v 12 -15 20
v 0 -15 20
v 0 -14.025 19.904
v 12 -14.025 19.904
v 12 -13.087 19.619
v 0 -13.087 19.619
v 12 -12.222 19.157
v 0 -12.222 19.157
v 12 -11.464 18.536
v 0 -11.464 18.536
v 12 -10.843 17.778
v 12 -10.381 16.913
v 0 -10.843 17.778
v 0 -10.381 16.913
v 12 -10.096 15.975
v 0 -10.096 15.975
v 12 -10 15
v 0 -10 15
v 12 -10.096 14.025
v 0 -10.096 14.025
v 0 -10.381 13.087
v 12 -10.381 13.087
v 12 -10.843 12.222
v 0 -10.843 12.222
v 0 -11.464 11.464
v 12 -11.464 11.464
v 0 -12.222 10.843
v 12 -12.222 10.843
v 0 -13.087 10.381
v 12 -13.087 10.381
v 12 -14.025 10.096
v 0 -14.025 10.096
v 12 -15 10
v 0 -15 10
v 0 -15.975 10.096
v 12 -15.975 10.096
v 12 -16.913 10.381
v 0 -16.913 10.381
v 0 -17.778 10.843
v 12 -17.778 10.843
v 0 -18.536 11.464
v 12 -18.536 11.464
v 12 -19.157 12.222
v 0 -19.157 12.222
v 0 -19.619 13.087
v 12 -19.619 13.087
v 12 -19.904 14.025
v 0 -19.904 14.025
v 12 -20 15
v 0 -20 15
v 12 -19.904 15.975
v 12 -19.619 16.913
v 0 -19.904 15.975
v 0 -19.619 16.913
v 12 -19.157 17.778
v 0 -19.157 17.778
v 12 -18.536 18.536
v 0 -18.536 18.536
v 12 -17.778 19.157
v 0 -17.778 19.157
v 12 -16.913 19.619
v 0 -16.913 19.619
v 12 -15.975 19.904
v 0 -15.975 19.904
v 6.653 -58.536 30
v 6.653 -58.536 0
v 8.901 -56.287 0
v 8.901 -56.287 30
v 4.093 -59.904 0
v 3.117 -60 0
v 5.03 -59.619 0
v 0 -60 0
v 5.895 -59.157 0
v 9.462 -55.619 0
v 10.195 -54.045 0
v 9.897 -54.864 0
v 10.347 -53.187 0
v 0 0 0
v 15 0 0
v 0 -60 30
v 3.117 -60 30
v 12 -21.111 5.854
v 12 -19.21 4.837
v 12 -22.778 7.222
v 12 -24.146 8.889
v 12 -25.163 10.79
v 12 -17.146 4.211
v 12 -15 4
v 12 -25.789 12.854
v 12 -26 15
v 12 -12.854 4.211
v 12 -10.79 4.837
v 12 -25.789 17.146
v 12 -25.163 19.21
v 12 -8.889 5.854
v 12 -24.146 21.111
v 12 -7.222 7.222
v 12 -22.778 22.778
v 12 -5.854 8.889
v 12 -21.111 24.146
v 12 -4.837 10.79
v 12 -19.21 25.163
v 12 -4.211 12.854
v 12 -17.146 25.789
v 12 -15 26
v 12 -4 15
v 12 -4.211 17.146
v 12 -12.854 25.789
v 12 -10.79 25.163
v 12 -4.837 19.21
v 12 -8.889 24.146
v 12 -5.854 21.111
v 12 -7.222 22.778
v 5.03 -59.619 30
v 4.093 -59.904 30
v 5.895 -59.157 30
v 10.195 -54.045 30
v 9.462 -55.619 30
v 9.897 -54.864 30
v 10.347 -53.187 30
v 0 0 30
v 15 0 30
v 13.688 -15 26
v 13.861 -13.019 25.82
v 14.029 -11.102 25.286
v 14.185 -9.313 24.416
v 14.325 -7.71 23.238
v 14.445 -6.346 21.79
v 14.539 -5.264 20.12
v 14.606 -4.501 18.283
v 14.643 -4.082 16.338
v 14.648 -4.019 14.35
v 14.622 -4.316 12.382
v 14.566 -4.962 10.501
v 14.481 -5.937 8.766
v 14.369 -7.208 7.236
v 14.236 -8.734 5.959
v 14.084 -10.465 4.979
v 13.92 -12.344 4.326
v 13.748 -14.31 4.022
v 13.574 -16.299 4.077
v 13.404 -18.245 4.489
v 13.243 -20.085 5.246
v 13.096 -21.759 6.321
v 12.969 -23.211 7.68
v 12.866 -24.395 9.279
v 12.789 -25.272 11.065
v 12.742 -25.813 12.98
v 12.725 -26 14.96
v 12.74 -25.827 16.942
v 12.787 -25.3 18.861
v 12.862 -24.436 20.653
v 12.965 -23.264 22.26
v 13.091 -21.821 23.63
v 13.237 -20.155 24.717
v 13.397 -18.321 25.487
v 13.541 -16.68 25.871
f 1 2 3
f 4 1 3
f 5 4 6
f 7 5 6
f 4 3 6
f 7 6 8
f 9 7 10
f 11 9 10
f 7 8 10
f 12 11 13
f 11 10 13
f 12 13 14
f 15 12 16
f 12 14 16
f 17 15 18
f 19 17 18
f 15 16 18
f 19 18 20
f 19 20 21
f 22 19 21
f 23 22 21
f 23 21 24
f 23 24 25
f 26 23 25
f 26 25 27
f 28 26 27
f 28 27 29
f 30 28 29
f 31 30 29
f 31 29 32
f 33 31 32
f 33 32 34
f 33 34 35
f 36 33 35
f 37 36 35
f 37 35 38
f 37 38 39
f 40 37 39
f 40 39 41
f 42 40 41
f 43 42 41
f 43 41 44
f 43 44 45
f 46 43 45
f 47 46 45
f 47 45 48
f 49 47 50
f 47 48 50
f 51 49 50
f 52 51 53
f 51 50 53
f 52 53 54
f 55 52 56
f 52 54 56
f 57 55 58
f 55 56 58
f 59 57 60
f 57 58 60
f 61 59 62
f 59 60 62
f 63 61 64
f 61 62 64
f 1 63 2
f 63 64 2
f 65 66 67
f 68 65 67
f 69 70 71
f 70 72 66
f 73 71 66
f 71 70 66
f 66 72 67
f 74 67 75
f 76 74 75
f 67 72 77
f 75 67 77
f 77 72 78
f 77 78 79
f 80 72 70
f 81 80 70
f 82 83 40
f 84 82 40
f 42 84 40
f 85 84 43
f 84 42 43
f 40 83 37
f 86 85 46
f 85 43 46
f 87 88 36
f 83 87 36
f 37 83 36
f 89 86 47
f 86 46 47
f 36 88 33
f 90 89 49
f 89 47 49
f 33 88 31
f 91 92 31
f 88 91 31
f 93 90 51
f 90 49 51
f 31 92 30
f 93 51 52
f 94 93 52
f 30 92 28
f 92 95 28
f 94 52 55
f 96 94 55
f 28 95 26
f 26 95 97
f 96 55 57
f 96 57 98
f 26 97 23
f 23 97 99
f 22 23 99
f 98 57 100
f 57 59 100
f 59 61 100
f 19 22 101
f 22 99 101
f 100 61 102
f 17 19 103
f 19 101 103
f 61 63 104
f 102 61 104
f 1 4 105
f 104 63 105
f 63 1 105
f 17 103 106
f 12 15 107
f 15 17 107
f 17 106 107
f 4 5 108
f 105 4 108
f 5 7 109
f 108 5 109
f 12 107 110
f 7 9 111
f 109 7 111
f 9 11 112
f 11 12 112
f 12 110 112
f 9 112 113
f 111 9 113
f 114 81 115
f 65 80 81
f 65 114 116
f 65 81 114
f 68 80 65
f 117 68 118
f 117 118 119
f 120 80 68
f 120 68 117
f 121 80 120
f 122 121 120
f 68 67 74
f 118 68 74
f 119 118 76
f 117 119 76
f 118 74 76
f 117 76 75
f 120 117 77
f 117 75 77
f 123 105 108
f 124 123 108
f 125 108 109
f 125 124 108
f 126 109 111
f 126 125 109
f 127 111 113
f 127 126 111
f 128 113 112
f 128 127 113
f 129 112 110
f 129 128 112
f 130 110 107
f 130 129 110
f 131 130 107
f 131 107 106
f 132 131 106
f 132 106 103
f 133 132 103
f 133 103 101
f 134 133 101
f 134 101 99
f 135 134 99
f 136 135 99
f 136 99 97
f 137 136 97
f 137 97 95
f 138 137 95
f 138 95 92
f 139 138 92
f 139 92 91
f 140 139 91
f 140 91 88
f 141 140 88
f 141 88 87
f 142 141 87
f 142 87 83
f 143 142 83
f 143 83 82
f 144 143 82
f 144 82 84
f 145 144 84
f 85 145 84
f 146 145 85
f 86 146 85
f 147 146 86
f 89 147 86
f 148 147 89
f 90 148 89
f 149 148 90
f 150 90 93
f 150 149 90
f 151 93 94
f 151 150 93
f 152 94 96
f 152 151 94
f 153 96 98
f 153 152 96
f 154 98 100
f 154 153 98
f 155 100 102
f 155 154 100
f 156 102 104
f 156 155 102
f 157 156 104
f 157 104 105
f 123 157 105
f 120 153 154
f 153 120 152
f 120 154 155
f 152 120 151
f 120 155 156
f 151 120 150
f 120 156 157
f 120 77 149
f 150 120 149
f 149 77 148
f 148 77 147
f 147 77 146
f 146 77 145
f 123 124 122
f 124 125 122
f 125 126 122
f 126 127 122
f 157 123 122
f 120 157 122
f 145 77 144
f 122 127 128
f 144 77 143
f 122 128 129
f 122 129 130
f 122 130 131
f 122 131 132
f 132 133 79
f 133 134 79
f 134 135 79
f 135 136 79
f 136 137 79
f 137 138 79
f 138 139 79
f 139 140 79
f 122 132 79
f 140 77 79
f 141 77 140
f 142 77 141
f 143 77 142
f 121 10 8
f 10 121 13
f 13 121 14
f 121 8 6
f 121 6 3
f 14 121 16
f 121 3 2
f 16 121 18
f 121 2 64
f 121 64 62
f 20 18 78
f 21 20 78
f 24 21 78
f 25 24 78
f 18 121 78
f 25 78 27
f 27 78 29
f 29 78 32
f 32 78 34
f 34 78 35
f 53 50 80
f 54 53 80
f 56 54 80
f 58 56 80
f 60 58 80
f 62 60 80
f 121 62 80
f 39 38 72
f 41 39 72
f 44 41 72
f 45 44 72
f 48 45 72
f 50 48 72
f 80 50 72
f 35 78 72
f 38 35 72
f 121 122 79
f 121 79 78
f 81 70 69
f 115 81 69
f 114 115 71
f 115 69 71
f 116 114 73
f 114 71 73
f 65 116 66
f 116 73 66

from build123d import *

# Parameters (mm, degrees)
EXTRUDE_1_DEPTH     = 30
SKETCH_3_R          = 5
CUT_EXTRUDE_2_DEPTH = 21
CUT_EXTRUDE_START   = -15
SKETCH_5_R          = 11
CUT_EXTRUDE_3_DEPTH = 3


with BuildPart() as part:
    # Эскиз1 → Бобышка-Вытянуть1 (new body)
    with BuildSketch(Plane.XY):
        with BuildLine():
            Line((0, 0), (0, -60))
            Line((0, -60), (3.117055694, -60))
            ThreePointArc((3.117055694, -60), (5.030472856, -59.619397663), (6.6525896, -58.535533906))
            Line((6.6525896, -58.535533906), (8.901294402, -56.286829104))
            ThreePointArc((8.901294402, -56.286829104), (9.897299431, -54.864386507), (10.346733987, -53.187073912))
            Line((10.346733987, -53.187073912), (15, 0))
            Line((15, 0), (0, 0))
        make_face()
    extrude(amount=EXTRUDE_1_DEPTH)

    # Эскиз3 → Вырез-Вытянуть2 (cut)
    with BuildSketch(Plane.ZY):
        with Locations((15, -15)):
            Circle(SKETCH_3_R)
    extrude(amount=-CUT_EXTRUDE_2_DEPTH, mode=Mode.SUBTRACT)

    # Эскиз5 → Вырез-Вытянуть3 (cut)
    with BuildSketch(Plane.ZY.offset(CUT_EXTRUDE_START)):
        with Locations((15, -15)):
            Circle(SKETCH_5_R)
    extrude(amount=CUT_EXTRUDE_3_DEPTH, mode=Mode.SUBTRACT)


solid = part.part
